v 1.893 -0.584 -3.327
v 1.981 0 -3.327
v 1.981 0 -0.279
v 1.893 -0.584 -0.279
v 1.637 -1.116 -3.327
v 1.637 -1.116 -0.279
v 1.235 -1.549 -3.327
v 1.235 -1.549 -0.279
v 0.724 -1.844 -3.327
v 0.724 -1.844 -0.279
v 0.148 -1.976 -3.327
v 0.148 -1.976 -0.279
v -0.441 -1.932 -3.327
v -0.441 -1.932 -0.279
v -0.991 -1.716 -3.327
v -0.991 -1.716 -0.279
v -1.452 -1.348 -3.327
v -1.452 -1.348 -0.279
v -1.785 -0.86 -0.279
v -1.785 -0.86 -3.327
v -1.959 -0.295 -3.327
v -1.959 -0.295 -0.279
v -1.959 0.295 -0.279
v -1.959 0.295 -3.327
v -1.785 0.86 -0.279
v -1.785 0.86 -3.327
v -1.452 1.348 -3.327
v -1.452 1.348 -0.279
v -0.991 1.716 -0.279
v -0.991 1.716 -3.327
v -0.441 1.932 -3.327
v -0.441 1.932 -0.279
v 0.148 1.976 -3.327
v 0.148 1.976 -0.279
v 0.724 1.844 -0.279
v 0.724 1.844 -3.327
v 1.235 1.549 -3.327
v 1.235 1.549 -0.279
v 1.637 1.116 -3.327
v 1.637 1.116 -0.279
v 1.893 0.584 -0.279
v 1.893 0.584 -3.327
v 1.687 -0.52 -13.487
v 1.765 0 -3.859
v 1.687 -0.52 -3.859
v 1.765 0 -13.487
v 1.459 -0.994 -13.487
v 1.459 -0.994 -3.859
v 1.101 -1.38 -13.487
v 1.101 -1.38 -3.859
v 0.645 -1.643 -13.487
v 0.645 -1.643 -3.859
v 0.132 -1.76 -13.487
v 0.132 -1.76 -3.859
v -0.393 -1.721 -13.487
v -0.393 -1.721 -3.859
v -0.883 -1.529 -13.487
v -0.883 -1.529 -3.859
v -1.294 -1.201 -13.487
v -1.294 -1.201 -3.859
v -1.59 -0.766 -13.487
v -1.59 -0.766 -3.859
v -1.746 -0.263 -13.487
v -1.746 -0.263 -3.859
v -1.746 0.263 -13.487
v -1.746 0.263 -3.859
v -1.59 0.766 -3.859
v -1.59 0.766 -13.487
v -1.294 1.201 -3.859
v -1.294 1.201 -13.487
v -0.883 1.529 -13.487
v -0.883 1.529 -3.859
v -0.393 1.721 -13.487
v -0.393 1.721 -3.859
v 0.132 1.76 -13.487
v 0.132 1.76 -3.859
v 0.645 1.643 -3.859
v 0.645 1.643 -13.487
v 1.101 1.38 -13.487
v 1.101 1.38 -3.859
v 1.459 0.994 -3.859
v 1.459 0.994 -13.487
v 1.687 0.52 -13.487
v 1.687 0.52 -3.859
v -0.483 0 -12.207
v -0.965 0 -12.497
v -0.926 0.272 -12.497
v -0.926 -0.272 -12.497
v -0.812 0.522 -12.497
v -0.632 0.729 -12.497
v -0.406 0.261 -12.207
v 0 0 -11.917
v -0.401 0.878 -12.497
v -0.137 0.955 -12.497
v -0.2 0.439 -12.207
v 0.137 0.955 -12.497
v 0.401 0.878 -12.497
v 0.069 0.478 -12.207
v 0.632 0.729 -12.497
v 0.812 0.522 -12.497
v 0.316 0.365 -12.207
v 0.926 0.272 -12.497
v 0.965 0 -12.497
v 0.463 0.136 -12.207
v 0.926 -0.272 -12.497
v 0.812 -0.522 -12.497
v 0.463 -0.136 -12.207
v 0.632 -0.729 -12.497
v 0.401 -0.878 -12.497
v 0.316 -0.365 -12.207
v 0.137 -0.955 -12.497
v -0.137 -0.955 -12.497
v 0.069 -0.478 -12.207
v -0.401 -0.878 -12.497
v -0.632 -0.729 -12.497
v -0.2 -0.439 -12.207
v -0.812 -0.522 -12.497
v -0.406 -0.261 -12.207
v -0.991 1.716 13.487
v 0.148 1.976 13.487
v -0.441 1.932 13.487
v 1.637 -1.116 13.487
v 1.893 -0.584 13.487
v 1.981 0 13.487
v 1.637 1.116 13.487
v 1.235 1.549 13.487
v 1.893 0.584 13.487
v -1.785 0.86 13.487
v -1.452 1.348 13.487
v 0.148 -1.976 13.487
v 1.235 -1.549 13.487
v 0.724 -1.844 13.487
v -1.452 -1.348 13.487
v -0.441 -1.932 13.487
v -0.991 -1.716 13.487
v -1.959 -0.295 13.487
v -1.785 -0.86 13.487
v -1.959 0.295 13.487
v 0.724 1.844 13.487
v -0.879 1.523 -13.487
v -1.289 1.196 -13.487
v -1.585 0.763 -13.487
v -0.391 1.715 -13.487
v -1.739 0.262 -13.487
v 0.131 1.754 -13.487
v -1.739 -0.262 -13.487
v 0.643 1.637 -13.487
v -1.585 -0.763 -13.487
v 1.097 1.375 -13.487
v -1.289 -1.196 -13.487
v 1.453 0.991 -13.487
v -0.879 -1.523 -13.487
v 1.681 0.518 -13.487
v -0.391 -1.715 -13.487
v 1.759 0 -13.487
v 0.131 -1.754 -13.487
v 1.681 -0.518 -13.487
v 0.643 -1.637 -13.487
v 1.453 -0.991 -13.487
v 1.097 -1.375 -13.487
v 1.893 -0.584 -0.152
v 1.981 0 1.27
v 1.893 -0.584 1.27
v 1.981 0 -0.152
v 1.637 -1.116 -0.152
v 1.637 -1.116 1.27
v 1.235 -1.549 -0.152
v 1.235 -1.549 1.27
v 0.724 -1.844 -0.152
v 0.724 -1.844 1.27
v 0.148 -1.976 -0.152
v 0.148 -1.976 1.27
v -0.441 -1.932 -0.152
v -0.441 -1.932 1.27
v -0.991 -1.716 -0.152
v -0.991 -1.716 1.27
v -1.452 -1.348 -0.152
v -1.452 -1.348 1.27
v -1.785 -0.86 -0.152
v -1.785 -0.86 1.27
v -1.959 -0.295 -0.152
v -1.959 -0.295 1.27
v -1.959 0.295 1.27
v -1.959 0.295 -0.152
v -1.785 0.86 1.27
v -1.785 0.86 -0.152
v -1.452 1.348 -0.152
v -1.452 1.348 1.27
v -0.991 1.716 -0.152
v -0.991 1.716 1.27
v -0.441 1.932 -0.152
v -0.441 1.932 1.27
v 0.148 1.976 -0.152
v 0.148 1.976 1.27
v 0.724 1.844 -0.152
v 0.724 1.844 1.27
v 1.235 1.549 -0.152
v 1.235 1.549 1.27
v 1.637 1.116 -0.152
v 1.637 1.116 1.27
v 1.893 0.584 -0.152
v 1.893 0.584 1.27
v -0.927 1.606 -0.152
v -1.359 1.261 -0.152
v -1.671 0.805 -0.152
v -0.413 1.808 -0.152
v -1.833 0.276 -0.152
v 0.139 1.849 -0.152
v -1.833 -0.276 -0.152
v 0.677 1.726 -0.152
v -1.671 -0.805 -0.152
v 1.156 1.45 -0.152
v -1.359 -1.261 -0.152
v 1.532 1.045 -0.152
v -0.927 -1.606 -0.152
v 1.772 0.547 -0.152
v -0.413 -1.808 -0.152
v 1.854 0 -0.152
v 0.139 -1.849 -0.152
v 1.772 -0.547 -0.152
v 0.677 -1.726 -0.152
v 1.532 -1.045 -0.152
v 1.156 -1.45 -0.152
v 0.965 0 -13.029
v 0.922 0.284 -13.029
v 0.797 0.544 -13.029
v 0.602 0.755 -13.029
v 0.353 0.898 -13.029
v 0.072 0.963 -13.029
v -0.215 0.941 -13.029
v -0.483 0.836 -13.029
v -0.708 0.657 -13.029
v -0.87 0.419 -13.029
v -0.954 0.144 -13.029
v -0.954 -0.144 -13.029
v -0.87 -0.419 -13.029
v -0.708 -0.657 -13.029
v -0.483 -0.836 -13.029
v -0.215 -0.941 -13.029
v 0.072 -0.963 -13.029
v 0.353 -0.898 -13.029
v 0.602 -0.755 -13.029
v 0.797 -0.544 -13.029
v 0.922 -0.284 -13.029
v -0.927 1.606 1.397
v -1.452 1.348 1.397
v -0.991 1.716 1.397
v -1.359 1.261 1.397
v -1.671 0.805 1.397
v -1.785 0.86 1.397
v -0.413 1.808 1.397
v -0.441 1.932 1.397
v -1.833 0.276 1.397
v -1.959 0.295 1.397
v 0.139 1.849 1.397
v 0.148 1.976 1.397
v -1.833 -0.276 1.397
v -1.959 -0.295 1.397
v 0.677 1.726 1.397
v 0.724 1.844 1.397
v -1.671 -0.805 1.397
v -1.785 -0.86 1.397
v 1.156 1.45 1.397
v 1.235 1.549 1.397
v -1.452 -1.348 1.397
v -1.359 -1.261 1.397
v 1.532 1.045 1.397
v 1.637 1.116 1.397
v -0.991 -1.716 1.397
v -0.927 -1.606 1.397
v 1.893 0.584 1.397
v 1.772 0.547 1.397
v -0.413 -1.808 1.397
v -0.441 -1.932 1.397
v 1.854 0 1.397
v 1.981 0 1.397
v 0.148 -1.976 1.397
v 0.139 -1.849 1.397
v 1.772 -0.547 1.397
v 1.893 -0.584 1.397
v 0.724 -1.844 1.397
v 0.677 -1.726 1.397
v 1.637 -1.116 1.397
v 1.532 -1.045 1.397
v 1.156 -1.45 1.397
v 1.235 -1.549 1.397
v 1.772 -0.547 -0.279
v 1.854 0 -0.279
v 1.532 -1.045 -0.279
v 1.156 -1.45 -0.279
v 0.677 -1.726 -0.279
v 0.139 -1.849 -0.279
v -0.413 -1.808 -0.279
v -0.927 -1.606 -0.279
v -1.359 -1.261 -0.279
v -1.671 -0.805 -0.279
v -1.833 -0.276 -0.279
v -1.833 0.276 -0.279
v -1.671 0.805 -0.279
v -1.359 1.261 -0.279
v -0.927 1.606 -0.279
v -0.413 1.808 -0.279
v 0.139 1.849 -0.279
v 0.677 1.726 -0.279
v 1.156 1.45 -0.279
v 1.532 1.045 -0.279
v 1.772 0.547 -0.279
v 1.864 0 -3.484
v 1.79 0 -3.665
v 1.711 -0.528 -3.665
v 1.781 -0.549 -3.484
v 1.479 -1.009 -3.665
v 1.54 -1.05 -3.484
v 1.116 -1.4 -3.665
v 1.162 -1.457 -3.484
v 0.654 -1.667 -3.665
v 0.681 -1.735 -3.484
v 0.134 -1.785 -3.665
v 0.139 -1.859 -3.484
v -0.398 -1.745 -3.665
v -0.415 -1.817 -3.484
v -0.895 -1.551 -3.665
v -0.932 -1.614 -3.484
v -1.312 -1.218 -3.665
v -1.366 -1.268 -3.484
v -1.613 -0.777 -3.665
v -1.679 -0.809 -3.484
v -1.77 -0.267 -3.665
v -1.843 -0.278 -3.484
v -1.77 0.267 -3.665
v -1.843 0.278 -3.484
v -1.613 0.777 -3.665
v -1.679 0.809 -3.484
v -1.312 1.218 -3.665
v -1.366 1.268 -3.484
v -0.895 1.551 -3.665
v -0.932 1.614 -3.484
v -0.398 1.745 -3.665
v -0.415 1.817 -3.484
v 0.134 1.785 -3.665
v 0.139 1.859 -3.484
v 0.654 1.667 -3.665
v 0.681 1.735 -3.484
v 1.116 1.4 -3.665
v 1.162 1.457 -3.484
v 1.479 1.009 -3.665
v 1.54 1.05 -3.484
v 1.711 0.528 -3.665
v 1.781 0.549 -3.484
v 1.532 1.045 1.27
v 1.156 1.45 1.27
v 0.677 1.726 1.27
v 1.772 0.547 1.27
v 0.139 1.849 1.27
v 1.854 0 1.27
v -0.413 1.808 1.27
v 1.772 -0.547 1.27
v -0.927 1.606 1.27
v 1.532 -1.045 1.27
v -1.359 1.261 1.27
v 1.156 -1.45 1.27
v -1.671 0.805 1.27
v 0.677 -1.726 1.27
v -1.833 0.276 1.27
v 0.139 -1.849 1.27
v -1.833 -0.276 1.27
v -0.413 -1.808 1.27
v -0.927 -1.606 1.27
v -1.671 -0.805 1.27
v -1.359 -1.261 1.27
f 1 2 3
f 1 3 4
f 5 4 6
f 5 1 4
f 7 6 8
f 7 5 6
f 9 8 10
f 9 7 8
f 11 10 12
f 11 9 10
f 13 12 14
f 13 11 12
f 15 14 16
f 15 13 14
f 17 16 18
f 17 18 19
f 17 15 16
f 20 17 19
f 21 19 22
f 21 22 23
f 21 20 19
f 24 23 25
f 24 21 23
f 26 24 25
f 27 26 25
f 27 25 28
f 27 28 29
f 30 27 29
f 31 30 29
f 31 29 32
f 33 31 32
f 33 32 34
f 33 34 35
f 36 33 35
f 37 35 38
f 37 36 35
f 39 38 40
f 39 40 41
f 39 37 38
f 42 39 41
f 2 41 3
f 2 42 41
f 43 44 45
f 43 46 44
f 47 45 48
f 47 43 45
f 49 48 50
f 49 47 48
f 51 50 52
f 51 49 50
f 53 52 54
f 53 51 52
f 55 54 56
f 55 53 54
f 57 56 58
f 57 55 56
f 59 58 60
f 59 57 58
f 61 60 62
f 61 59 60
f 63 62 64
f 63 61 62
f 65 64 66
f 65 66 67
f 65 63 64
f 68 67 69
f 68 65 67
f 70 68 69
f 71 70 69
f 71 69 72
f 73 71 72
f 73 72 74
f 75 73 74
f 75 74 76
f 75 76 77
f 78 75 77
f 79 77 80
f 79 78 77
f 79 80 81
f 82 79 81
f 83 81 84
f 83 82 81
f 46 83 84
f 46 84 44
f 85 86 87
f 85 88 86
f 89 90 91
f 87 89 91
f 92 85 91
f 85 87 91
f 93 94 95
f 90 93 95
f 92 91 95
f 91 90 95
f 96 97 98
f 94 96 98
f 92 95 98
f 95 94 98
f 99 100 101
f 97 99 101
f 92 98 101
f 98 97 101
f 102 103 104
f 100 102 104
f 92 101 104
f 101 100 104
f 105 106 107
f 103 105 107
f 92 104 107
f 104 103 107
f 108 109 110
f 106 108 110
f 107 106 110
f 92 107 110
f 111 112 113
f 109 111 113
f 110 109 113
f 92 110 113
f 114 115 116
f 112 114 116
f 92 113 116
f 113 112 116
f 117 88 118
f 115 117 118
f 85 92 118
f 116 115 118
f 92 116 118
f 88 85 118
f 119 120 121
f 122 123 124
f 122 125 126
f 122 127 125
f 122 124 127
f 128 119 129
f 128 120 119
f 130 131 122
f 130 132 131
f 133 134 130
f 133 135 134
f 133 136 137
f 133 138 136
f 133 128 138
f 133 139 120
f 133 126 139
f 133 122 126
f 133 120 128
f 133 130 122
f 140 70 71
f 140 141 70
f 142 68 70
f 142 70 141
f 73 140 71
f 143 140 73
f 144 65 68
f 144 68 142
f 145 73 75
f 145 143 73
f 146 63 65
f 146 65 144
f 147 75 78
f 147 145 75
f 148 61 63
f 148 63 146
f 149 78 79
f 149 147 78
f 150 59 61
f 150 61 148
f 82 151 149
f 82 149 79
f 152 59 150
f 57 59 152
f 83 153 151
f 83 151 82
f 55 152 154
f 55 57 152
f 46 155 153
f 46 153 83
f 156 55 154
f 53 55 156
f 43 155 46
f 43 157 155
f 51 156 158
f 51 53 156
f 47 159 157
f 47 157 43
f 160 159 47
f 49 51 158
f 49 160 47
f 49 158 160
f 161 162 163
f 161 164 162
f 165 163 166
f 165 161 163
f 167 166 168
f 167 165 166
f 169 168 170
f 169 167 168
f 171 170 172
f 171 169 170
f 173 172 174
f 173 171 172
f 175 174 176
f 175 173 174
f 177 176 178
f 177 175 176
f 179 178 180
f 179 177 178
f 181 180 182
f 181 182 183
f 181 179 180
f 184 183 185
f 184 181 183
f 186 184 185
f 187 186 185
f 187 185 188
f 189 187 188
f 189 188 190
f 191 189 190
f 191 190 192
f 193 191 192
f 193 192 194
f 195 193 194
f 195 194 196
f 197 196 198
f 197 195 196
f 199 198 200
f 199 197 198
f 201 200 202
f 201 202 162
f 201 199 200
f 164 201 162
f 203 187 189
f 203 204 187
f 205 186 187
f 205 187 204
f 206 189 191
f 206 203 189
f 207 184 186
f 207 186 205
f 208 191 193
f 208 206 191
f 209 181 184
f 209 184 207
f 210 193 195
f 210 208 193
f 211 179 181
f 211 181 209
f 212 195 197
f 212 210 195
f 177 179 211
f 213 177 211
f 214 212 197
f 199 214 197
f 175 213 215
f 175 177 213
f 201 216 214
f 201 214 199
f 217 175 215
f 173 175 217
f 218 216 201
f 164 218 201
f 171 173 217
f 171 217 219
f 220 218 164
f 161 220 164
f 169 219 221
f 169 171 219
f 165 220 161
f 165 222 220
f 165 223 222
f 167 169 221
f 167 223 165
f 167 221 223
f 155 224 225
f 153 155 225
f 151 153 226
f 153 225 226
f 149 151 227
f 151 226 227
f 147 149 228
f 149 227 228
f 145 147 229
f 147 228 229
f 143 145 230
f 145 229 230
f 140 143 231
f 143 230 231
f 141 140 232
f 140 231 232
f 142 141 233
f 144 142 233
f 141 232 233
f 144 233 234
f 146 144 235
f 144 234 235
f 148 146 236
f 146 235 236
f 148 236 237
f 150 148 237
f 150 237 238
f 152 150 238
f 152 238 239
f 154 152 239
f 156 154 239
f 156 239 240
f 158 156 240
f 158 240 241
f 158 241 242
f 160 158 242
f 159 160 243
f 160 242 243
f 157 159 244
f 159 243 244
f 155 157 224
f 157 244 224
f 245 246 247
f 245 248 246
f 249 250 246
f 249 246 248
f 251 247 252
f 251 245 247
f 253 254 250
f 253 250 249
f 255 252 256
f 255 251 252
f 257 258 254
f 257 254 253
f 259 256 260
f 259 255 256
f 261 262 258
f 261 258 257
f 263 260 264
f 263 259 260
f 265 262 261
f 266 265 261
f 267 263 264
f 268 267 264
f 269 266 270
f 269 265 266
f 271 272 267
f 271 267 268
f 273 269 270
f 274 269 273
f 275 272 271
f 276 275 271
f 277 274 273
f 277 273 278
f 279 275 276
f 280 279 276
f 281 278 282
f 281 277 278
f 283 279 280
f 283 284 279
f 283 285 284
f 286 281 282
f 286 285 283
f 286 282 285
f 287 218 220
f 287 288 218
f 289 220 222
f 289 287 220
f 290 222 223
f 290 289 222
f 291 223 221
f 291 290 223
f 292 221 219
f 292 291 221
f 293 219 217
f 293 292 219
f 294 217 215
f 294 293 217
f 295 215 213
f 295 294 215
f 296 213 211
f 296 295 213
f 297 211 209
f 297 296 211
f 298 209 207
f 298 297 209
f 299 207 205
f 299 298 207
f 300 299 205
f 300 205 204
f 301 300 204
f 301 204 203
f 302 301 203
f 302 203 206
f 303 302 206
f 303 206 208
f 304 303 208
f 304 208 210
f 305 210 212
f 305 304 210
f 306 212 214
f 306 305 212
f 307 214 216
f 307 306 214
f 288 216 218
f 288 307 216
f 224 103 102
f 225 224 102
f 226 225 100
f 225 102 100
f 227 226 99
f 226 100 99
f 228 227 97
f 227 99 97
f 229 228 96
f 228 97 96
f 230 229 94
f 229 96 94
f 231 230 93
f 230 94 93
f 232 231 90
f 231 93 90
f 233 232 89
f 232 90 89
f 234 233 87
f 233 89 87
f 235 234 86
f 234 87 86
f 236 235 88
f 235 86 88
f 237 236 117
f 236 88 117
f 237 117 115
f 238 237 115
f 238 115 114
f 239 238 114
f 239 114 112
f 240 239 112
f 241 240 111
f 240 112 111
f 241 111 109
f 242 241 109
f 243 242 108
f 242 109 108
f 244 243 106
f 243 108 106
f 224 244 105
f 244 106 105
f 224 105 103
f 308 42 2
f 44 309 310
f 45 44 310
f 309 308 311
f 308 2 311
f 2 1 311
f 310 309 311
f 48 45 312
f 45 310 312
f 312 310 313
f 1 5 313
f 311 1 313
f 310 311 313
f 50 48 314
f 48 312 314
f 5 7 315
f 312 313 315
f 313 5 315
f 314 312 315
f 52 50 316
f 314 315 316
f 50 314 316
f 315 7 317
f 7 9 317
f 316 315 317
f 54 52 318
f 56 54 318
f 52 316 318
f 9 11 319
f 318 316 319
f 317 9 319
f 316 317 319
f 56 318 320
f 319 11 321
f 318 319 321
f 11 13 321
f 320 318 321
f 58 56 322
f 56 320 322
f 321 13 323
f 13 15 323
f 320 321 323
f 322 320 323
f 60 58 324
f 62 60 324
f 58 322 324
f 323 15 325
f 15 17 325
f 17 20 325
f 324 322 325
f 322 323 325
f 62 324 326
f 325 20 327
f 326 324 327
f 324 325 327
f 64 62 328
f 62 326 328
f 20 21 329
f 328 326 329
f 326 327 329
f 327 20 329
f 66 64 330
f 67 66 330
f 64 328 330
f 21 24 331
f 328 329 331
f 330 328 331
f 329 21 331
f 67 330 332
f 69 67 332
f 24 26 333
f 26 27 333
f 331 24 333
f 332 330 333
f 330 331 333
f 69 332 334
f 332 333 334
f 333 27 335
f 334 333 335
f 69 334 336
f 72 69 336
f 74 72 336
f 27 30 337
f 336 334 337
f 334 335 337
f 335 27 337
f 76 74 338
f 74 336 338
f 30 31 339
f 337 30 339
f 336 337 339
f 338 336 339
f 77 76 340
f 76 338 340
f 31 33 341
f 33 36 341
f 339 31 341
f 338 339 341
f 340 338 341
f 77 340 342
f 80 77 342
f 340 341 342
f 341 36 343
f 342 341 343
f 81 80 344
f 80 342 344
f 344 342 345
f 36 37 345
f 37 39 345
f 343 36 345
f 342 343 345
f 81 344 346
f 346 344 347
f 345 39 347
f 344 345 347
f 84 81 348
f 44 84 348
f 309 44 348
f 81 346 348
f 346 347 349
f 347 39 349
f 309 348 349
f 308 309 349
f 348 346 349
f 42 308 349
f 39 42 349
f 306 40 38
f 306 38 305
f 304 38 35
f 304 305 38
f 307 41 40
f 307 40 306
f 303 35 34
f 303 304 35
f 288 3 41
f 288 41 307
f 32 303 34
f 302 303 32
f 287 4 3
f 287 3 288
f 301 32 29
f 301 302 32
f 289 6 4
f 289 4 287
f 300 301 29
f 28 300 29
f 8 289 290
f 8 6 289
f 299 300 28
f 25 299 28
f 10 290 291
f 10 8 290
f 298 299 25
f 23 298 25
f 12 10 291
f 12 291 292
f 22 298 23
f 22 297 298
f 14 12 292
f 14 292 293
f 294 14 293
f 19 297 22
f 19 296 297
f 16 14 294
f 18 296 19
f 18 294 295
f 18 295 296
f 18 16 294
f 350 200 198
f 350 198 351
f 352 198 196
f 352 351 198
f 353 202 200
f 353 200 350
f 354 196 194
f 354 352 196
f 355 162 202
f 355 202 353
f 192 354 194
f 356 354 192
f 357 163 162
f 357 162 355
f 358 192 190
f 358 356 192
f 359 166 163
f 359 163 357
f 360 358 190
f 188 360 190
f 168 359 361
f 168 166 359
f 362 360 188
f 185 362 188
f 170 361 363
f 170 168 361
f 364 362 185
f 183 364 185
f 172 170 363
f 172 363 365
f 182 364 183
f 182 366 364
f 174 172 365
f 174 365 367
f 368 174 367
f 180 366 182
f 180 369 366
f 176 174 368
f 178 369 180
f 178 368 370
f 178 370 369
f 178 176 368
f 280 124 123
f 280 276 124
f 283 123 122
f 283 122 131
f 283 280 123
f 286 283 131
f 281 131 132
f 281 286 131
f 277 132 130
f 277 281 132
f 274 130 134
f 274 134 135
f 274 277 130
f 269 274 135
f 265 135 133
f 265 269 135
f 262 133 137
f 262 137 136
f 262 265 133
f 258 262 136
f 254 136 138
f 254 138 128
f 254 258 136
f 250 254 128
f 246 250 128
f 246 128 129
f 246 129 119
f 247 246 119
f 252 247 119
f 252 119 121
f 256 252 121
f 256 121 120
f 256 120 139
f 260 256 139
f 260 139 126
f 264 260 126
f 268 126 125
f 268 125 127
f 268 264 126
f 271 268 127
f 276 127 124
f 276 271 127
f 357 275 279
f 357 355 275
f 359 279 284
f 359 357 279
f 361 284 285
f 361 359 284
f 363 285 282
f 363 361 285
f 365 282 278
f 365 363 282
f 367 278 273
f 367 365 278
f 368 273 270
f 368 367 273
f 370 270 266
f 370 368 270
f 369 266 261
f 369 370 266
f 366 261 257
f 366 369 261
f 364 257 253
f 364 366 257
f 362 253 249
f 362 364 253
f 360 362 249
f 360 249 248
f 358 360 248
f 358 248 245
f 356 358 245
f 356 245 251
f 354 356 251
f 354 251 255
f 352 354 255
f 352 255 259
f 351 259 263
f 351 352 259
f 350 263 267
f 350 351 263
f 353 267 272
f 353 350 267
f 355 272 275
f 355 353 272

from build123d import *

# Parameters (mm, degrees)
REDONDEO1_R                      = 0.762
TALADRO_DE_MARGEN_PARA_101_D     = 1.9304
TALADRO_DE_MARGEN_PARA_101_DEPTH = 0.9906
TALADRO_DE_MARGEN_PARA_101_TIP   = 0.579950669
CHAFL_N1_SIZE                    = 0.79375
CHAFL_N1_SIZE2                   = 0.458271776


with BuildPart() as part:
    # Croquis1 → Revolución1 (revolve)
    with BuildSketch(Plane(origin=(0, 0, 0), x_dir=(0, 0, -1), z_dir=(1, 0, 0)), mode=Mode.PRIVATE) as revoluci_n1_sk:
        Polygon((-13.4874, 0), (-13.4874, 1.9812), (-1.397, 1.9812), (-1.397, 1.8542), (-1.27, 1.8542), (-1.27, 1.9812), (0.1524, 1.9812), (0.1524, 1.8542), (0.2794, 1.8542), (0.2794, 1.9812), (3.3274, 1.9812), (3.3274, 1.7653), (13.4874, 1.7653), (13.4874, 0), align=None)
    revolve(revoluci_n1_sk.sketch.rotate(Axis((0, 0, 127), (0, 0, -1)), 90), axis=Axis((0, 0, 127), (0, 0, -1)))

    # Redondeo1
    # the kernel refuses this fillet: 0.762 mm, written as the material it adds along each edge
    with BuildSketch(Plane(origin=(0, 0, -3.3274), x_dir=(1, 0, 0), z_dir=(0, 1, 0))) as redondeo1_piece_1:
        with BuildLine():
            CenterArc((2.5273, 0.531430889), REDONDEO1_R, 180, 44.220044428)
            Line((1.7653, 0.531430889), (1.75006, 0.531430889))
            Line((1.75006, 0.531430889), (1.75006, 0))
            Line((1.75006, 0), (1.7653, -0.01524))
            ThreePointArc((1.7653, -0.01524), (1.87325, -0.01524), (1.970278, -0.010628618))
            Line((1.970278, -0.010628618), (1.9812, 0))
        make_face()
    revolve(axis=Axis((0, 0, -3.3274), (0, 0, -1)))

    # Taladro de margen para #101
    with Locations(Plane(origin=(0, 0, -13.4874), x_dir=(-1, 0, 0), z_dir=(0, 0, -1))):
        with Locations((0, 0)):
            Hole(TALADRO_DE_MARGEN_PARA_101_D / 2, depth=TALADRO_DE_MARGEN_PARA_101_DEPTH)
            with Locations((0, 0, -(TALADRO_DE_MARGEN_PARA_101_DEPTH + TALADRO_DE_MARGEN_PARA_101_TIP / 2))):  # 118° drill point
                Cone(0, TALADRO_DE_MARGEN_PARA_101_D / 2, TALADRO_DE_MARGEN_PARA_101_TIP, mode=Mode.SUBTRACT)

    # Chaflán1
    chafl_n1_edges = [part.edges().sort_by_distance(p)[0] for p in [
        (-0.9652, 0, -13.4874),
    ]]
    chafl_n1_side = [part.faces().sort_by_distance(p)[0] for p in [
        (-1.715369776, 0, -13.4874),
    ]]
    chamfer(chafl_n1_edges, length=CHAFL_N1_SIZE, length2=CHAFL_N1_SIZE2, reference=chafl_n1_side[0])


solid = part.part
